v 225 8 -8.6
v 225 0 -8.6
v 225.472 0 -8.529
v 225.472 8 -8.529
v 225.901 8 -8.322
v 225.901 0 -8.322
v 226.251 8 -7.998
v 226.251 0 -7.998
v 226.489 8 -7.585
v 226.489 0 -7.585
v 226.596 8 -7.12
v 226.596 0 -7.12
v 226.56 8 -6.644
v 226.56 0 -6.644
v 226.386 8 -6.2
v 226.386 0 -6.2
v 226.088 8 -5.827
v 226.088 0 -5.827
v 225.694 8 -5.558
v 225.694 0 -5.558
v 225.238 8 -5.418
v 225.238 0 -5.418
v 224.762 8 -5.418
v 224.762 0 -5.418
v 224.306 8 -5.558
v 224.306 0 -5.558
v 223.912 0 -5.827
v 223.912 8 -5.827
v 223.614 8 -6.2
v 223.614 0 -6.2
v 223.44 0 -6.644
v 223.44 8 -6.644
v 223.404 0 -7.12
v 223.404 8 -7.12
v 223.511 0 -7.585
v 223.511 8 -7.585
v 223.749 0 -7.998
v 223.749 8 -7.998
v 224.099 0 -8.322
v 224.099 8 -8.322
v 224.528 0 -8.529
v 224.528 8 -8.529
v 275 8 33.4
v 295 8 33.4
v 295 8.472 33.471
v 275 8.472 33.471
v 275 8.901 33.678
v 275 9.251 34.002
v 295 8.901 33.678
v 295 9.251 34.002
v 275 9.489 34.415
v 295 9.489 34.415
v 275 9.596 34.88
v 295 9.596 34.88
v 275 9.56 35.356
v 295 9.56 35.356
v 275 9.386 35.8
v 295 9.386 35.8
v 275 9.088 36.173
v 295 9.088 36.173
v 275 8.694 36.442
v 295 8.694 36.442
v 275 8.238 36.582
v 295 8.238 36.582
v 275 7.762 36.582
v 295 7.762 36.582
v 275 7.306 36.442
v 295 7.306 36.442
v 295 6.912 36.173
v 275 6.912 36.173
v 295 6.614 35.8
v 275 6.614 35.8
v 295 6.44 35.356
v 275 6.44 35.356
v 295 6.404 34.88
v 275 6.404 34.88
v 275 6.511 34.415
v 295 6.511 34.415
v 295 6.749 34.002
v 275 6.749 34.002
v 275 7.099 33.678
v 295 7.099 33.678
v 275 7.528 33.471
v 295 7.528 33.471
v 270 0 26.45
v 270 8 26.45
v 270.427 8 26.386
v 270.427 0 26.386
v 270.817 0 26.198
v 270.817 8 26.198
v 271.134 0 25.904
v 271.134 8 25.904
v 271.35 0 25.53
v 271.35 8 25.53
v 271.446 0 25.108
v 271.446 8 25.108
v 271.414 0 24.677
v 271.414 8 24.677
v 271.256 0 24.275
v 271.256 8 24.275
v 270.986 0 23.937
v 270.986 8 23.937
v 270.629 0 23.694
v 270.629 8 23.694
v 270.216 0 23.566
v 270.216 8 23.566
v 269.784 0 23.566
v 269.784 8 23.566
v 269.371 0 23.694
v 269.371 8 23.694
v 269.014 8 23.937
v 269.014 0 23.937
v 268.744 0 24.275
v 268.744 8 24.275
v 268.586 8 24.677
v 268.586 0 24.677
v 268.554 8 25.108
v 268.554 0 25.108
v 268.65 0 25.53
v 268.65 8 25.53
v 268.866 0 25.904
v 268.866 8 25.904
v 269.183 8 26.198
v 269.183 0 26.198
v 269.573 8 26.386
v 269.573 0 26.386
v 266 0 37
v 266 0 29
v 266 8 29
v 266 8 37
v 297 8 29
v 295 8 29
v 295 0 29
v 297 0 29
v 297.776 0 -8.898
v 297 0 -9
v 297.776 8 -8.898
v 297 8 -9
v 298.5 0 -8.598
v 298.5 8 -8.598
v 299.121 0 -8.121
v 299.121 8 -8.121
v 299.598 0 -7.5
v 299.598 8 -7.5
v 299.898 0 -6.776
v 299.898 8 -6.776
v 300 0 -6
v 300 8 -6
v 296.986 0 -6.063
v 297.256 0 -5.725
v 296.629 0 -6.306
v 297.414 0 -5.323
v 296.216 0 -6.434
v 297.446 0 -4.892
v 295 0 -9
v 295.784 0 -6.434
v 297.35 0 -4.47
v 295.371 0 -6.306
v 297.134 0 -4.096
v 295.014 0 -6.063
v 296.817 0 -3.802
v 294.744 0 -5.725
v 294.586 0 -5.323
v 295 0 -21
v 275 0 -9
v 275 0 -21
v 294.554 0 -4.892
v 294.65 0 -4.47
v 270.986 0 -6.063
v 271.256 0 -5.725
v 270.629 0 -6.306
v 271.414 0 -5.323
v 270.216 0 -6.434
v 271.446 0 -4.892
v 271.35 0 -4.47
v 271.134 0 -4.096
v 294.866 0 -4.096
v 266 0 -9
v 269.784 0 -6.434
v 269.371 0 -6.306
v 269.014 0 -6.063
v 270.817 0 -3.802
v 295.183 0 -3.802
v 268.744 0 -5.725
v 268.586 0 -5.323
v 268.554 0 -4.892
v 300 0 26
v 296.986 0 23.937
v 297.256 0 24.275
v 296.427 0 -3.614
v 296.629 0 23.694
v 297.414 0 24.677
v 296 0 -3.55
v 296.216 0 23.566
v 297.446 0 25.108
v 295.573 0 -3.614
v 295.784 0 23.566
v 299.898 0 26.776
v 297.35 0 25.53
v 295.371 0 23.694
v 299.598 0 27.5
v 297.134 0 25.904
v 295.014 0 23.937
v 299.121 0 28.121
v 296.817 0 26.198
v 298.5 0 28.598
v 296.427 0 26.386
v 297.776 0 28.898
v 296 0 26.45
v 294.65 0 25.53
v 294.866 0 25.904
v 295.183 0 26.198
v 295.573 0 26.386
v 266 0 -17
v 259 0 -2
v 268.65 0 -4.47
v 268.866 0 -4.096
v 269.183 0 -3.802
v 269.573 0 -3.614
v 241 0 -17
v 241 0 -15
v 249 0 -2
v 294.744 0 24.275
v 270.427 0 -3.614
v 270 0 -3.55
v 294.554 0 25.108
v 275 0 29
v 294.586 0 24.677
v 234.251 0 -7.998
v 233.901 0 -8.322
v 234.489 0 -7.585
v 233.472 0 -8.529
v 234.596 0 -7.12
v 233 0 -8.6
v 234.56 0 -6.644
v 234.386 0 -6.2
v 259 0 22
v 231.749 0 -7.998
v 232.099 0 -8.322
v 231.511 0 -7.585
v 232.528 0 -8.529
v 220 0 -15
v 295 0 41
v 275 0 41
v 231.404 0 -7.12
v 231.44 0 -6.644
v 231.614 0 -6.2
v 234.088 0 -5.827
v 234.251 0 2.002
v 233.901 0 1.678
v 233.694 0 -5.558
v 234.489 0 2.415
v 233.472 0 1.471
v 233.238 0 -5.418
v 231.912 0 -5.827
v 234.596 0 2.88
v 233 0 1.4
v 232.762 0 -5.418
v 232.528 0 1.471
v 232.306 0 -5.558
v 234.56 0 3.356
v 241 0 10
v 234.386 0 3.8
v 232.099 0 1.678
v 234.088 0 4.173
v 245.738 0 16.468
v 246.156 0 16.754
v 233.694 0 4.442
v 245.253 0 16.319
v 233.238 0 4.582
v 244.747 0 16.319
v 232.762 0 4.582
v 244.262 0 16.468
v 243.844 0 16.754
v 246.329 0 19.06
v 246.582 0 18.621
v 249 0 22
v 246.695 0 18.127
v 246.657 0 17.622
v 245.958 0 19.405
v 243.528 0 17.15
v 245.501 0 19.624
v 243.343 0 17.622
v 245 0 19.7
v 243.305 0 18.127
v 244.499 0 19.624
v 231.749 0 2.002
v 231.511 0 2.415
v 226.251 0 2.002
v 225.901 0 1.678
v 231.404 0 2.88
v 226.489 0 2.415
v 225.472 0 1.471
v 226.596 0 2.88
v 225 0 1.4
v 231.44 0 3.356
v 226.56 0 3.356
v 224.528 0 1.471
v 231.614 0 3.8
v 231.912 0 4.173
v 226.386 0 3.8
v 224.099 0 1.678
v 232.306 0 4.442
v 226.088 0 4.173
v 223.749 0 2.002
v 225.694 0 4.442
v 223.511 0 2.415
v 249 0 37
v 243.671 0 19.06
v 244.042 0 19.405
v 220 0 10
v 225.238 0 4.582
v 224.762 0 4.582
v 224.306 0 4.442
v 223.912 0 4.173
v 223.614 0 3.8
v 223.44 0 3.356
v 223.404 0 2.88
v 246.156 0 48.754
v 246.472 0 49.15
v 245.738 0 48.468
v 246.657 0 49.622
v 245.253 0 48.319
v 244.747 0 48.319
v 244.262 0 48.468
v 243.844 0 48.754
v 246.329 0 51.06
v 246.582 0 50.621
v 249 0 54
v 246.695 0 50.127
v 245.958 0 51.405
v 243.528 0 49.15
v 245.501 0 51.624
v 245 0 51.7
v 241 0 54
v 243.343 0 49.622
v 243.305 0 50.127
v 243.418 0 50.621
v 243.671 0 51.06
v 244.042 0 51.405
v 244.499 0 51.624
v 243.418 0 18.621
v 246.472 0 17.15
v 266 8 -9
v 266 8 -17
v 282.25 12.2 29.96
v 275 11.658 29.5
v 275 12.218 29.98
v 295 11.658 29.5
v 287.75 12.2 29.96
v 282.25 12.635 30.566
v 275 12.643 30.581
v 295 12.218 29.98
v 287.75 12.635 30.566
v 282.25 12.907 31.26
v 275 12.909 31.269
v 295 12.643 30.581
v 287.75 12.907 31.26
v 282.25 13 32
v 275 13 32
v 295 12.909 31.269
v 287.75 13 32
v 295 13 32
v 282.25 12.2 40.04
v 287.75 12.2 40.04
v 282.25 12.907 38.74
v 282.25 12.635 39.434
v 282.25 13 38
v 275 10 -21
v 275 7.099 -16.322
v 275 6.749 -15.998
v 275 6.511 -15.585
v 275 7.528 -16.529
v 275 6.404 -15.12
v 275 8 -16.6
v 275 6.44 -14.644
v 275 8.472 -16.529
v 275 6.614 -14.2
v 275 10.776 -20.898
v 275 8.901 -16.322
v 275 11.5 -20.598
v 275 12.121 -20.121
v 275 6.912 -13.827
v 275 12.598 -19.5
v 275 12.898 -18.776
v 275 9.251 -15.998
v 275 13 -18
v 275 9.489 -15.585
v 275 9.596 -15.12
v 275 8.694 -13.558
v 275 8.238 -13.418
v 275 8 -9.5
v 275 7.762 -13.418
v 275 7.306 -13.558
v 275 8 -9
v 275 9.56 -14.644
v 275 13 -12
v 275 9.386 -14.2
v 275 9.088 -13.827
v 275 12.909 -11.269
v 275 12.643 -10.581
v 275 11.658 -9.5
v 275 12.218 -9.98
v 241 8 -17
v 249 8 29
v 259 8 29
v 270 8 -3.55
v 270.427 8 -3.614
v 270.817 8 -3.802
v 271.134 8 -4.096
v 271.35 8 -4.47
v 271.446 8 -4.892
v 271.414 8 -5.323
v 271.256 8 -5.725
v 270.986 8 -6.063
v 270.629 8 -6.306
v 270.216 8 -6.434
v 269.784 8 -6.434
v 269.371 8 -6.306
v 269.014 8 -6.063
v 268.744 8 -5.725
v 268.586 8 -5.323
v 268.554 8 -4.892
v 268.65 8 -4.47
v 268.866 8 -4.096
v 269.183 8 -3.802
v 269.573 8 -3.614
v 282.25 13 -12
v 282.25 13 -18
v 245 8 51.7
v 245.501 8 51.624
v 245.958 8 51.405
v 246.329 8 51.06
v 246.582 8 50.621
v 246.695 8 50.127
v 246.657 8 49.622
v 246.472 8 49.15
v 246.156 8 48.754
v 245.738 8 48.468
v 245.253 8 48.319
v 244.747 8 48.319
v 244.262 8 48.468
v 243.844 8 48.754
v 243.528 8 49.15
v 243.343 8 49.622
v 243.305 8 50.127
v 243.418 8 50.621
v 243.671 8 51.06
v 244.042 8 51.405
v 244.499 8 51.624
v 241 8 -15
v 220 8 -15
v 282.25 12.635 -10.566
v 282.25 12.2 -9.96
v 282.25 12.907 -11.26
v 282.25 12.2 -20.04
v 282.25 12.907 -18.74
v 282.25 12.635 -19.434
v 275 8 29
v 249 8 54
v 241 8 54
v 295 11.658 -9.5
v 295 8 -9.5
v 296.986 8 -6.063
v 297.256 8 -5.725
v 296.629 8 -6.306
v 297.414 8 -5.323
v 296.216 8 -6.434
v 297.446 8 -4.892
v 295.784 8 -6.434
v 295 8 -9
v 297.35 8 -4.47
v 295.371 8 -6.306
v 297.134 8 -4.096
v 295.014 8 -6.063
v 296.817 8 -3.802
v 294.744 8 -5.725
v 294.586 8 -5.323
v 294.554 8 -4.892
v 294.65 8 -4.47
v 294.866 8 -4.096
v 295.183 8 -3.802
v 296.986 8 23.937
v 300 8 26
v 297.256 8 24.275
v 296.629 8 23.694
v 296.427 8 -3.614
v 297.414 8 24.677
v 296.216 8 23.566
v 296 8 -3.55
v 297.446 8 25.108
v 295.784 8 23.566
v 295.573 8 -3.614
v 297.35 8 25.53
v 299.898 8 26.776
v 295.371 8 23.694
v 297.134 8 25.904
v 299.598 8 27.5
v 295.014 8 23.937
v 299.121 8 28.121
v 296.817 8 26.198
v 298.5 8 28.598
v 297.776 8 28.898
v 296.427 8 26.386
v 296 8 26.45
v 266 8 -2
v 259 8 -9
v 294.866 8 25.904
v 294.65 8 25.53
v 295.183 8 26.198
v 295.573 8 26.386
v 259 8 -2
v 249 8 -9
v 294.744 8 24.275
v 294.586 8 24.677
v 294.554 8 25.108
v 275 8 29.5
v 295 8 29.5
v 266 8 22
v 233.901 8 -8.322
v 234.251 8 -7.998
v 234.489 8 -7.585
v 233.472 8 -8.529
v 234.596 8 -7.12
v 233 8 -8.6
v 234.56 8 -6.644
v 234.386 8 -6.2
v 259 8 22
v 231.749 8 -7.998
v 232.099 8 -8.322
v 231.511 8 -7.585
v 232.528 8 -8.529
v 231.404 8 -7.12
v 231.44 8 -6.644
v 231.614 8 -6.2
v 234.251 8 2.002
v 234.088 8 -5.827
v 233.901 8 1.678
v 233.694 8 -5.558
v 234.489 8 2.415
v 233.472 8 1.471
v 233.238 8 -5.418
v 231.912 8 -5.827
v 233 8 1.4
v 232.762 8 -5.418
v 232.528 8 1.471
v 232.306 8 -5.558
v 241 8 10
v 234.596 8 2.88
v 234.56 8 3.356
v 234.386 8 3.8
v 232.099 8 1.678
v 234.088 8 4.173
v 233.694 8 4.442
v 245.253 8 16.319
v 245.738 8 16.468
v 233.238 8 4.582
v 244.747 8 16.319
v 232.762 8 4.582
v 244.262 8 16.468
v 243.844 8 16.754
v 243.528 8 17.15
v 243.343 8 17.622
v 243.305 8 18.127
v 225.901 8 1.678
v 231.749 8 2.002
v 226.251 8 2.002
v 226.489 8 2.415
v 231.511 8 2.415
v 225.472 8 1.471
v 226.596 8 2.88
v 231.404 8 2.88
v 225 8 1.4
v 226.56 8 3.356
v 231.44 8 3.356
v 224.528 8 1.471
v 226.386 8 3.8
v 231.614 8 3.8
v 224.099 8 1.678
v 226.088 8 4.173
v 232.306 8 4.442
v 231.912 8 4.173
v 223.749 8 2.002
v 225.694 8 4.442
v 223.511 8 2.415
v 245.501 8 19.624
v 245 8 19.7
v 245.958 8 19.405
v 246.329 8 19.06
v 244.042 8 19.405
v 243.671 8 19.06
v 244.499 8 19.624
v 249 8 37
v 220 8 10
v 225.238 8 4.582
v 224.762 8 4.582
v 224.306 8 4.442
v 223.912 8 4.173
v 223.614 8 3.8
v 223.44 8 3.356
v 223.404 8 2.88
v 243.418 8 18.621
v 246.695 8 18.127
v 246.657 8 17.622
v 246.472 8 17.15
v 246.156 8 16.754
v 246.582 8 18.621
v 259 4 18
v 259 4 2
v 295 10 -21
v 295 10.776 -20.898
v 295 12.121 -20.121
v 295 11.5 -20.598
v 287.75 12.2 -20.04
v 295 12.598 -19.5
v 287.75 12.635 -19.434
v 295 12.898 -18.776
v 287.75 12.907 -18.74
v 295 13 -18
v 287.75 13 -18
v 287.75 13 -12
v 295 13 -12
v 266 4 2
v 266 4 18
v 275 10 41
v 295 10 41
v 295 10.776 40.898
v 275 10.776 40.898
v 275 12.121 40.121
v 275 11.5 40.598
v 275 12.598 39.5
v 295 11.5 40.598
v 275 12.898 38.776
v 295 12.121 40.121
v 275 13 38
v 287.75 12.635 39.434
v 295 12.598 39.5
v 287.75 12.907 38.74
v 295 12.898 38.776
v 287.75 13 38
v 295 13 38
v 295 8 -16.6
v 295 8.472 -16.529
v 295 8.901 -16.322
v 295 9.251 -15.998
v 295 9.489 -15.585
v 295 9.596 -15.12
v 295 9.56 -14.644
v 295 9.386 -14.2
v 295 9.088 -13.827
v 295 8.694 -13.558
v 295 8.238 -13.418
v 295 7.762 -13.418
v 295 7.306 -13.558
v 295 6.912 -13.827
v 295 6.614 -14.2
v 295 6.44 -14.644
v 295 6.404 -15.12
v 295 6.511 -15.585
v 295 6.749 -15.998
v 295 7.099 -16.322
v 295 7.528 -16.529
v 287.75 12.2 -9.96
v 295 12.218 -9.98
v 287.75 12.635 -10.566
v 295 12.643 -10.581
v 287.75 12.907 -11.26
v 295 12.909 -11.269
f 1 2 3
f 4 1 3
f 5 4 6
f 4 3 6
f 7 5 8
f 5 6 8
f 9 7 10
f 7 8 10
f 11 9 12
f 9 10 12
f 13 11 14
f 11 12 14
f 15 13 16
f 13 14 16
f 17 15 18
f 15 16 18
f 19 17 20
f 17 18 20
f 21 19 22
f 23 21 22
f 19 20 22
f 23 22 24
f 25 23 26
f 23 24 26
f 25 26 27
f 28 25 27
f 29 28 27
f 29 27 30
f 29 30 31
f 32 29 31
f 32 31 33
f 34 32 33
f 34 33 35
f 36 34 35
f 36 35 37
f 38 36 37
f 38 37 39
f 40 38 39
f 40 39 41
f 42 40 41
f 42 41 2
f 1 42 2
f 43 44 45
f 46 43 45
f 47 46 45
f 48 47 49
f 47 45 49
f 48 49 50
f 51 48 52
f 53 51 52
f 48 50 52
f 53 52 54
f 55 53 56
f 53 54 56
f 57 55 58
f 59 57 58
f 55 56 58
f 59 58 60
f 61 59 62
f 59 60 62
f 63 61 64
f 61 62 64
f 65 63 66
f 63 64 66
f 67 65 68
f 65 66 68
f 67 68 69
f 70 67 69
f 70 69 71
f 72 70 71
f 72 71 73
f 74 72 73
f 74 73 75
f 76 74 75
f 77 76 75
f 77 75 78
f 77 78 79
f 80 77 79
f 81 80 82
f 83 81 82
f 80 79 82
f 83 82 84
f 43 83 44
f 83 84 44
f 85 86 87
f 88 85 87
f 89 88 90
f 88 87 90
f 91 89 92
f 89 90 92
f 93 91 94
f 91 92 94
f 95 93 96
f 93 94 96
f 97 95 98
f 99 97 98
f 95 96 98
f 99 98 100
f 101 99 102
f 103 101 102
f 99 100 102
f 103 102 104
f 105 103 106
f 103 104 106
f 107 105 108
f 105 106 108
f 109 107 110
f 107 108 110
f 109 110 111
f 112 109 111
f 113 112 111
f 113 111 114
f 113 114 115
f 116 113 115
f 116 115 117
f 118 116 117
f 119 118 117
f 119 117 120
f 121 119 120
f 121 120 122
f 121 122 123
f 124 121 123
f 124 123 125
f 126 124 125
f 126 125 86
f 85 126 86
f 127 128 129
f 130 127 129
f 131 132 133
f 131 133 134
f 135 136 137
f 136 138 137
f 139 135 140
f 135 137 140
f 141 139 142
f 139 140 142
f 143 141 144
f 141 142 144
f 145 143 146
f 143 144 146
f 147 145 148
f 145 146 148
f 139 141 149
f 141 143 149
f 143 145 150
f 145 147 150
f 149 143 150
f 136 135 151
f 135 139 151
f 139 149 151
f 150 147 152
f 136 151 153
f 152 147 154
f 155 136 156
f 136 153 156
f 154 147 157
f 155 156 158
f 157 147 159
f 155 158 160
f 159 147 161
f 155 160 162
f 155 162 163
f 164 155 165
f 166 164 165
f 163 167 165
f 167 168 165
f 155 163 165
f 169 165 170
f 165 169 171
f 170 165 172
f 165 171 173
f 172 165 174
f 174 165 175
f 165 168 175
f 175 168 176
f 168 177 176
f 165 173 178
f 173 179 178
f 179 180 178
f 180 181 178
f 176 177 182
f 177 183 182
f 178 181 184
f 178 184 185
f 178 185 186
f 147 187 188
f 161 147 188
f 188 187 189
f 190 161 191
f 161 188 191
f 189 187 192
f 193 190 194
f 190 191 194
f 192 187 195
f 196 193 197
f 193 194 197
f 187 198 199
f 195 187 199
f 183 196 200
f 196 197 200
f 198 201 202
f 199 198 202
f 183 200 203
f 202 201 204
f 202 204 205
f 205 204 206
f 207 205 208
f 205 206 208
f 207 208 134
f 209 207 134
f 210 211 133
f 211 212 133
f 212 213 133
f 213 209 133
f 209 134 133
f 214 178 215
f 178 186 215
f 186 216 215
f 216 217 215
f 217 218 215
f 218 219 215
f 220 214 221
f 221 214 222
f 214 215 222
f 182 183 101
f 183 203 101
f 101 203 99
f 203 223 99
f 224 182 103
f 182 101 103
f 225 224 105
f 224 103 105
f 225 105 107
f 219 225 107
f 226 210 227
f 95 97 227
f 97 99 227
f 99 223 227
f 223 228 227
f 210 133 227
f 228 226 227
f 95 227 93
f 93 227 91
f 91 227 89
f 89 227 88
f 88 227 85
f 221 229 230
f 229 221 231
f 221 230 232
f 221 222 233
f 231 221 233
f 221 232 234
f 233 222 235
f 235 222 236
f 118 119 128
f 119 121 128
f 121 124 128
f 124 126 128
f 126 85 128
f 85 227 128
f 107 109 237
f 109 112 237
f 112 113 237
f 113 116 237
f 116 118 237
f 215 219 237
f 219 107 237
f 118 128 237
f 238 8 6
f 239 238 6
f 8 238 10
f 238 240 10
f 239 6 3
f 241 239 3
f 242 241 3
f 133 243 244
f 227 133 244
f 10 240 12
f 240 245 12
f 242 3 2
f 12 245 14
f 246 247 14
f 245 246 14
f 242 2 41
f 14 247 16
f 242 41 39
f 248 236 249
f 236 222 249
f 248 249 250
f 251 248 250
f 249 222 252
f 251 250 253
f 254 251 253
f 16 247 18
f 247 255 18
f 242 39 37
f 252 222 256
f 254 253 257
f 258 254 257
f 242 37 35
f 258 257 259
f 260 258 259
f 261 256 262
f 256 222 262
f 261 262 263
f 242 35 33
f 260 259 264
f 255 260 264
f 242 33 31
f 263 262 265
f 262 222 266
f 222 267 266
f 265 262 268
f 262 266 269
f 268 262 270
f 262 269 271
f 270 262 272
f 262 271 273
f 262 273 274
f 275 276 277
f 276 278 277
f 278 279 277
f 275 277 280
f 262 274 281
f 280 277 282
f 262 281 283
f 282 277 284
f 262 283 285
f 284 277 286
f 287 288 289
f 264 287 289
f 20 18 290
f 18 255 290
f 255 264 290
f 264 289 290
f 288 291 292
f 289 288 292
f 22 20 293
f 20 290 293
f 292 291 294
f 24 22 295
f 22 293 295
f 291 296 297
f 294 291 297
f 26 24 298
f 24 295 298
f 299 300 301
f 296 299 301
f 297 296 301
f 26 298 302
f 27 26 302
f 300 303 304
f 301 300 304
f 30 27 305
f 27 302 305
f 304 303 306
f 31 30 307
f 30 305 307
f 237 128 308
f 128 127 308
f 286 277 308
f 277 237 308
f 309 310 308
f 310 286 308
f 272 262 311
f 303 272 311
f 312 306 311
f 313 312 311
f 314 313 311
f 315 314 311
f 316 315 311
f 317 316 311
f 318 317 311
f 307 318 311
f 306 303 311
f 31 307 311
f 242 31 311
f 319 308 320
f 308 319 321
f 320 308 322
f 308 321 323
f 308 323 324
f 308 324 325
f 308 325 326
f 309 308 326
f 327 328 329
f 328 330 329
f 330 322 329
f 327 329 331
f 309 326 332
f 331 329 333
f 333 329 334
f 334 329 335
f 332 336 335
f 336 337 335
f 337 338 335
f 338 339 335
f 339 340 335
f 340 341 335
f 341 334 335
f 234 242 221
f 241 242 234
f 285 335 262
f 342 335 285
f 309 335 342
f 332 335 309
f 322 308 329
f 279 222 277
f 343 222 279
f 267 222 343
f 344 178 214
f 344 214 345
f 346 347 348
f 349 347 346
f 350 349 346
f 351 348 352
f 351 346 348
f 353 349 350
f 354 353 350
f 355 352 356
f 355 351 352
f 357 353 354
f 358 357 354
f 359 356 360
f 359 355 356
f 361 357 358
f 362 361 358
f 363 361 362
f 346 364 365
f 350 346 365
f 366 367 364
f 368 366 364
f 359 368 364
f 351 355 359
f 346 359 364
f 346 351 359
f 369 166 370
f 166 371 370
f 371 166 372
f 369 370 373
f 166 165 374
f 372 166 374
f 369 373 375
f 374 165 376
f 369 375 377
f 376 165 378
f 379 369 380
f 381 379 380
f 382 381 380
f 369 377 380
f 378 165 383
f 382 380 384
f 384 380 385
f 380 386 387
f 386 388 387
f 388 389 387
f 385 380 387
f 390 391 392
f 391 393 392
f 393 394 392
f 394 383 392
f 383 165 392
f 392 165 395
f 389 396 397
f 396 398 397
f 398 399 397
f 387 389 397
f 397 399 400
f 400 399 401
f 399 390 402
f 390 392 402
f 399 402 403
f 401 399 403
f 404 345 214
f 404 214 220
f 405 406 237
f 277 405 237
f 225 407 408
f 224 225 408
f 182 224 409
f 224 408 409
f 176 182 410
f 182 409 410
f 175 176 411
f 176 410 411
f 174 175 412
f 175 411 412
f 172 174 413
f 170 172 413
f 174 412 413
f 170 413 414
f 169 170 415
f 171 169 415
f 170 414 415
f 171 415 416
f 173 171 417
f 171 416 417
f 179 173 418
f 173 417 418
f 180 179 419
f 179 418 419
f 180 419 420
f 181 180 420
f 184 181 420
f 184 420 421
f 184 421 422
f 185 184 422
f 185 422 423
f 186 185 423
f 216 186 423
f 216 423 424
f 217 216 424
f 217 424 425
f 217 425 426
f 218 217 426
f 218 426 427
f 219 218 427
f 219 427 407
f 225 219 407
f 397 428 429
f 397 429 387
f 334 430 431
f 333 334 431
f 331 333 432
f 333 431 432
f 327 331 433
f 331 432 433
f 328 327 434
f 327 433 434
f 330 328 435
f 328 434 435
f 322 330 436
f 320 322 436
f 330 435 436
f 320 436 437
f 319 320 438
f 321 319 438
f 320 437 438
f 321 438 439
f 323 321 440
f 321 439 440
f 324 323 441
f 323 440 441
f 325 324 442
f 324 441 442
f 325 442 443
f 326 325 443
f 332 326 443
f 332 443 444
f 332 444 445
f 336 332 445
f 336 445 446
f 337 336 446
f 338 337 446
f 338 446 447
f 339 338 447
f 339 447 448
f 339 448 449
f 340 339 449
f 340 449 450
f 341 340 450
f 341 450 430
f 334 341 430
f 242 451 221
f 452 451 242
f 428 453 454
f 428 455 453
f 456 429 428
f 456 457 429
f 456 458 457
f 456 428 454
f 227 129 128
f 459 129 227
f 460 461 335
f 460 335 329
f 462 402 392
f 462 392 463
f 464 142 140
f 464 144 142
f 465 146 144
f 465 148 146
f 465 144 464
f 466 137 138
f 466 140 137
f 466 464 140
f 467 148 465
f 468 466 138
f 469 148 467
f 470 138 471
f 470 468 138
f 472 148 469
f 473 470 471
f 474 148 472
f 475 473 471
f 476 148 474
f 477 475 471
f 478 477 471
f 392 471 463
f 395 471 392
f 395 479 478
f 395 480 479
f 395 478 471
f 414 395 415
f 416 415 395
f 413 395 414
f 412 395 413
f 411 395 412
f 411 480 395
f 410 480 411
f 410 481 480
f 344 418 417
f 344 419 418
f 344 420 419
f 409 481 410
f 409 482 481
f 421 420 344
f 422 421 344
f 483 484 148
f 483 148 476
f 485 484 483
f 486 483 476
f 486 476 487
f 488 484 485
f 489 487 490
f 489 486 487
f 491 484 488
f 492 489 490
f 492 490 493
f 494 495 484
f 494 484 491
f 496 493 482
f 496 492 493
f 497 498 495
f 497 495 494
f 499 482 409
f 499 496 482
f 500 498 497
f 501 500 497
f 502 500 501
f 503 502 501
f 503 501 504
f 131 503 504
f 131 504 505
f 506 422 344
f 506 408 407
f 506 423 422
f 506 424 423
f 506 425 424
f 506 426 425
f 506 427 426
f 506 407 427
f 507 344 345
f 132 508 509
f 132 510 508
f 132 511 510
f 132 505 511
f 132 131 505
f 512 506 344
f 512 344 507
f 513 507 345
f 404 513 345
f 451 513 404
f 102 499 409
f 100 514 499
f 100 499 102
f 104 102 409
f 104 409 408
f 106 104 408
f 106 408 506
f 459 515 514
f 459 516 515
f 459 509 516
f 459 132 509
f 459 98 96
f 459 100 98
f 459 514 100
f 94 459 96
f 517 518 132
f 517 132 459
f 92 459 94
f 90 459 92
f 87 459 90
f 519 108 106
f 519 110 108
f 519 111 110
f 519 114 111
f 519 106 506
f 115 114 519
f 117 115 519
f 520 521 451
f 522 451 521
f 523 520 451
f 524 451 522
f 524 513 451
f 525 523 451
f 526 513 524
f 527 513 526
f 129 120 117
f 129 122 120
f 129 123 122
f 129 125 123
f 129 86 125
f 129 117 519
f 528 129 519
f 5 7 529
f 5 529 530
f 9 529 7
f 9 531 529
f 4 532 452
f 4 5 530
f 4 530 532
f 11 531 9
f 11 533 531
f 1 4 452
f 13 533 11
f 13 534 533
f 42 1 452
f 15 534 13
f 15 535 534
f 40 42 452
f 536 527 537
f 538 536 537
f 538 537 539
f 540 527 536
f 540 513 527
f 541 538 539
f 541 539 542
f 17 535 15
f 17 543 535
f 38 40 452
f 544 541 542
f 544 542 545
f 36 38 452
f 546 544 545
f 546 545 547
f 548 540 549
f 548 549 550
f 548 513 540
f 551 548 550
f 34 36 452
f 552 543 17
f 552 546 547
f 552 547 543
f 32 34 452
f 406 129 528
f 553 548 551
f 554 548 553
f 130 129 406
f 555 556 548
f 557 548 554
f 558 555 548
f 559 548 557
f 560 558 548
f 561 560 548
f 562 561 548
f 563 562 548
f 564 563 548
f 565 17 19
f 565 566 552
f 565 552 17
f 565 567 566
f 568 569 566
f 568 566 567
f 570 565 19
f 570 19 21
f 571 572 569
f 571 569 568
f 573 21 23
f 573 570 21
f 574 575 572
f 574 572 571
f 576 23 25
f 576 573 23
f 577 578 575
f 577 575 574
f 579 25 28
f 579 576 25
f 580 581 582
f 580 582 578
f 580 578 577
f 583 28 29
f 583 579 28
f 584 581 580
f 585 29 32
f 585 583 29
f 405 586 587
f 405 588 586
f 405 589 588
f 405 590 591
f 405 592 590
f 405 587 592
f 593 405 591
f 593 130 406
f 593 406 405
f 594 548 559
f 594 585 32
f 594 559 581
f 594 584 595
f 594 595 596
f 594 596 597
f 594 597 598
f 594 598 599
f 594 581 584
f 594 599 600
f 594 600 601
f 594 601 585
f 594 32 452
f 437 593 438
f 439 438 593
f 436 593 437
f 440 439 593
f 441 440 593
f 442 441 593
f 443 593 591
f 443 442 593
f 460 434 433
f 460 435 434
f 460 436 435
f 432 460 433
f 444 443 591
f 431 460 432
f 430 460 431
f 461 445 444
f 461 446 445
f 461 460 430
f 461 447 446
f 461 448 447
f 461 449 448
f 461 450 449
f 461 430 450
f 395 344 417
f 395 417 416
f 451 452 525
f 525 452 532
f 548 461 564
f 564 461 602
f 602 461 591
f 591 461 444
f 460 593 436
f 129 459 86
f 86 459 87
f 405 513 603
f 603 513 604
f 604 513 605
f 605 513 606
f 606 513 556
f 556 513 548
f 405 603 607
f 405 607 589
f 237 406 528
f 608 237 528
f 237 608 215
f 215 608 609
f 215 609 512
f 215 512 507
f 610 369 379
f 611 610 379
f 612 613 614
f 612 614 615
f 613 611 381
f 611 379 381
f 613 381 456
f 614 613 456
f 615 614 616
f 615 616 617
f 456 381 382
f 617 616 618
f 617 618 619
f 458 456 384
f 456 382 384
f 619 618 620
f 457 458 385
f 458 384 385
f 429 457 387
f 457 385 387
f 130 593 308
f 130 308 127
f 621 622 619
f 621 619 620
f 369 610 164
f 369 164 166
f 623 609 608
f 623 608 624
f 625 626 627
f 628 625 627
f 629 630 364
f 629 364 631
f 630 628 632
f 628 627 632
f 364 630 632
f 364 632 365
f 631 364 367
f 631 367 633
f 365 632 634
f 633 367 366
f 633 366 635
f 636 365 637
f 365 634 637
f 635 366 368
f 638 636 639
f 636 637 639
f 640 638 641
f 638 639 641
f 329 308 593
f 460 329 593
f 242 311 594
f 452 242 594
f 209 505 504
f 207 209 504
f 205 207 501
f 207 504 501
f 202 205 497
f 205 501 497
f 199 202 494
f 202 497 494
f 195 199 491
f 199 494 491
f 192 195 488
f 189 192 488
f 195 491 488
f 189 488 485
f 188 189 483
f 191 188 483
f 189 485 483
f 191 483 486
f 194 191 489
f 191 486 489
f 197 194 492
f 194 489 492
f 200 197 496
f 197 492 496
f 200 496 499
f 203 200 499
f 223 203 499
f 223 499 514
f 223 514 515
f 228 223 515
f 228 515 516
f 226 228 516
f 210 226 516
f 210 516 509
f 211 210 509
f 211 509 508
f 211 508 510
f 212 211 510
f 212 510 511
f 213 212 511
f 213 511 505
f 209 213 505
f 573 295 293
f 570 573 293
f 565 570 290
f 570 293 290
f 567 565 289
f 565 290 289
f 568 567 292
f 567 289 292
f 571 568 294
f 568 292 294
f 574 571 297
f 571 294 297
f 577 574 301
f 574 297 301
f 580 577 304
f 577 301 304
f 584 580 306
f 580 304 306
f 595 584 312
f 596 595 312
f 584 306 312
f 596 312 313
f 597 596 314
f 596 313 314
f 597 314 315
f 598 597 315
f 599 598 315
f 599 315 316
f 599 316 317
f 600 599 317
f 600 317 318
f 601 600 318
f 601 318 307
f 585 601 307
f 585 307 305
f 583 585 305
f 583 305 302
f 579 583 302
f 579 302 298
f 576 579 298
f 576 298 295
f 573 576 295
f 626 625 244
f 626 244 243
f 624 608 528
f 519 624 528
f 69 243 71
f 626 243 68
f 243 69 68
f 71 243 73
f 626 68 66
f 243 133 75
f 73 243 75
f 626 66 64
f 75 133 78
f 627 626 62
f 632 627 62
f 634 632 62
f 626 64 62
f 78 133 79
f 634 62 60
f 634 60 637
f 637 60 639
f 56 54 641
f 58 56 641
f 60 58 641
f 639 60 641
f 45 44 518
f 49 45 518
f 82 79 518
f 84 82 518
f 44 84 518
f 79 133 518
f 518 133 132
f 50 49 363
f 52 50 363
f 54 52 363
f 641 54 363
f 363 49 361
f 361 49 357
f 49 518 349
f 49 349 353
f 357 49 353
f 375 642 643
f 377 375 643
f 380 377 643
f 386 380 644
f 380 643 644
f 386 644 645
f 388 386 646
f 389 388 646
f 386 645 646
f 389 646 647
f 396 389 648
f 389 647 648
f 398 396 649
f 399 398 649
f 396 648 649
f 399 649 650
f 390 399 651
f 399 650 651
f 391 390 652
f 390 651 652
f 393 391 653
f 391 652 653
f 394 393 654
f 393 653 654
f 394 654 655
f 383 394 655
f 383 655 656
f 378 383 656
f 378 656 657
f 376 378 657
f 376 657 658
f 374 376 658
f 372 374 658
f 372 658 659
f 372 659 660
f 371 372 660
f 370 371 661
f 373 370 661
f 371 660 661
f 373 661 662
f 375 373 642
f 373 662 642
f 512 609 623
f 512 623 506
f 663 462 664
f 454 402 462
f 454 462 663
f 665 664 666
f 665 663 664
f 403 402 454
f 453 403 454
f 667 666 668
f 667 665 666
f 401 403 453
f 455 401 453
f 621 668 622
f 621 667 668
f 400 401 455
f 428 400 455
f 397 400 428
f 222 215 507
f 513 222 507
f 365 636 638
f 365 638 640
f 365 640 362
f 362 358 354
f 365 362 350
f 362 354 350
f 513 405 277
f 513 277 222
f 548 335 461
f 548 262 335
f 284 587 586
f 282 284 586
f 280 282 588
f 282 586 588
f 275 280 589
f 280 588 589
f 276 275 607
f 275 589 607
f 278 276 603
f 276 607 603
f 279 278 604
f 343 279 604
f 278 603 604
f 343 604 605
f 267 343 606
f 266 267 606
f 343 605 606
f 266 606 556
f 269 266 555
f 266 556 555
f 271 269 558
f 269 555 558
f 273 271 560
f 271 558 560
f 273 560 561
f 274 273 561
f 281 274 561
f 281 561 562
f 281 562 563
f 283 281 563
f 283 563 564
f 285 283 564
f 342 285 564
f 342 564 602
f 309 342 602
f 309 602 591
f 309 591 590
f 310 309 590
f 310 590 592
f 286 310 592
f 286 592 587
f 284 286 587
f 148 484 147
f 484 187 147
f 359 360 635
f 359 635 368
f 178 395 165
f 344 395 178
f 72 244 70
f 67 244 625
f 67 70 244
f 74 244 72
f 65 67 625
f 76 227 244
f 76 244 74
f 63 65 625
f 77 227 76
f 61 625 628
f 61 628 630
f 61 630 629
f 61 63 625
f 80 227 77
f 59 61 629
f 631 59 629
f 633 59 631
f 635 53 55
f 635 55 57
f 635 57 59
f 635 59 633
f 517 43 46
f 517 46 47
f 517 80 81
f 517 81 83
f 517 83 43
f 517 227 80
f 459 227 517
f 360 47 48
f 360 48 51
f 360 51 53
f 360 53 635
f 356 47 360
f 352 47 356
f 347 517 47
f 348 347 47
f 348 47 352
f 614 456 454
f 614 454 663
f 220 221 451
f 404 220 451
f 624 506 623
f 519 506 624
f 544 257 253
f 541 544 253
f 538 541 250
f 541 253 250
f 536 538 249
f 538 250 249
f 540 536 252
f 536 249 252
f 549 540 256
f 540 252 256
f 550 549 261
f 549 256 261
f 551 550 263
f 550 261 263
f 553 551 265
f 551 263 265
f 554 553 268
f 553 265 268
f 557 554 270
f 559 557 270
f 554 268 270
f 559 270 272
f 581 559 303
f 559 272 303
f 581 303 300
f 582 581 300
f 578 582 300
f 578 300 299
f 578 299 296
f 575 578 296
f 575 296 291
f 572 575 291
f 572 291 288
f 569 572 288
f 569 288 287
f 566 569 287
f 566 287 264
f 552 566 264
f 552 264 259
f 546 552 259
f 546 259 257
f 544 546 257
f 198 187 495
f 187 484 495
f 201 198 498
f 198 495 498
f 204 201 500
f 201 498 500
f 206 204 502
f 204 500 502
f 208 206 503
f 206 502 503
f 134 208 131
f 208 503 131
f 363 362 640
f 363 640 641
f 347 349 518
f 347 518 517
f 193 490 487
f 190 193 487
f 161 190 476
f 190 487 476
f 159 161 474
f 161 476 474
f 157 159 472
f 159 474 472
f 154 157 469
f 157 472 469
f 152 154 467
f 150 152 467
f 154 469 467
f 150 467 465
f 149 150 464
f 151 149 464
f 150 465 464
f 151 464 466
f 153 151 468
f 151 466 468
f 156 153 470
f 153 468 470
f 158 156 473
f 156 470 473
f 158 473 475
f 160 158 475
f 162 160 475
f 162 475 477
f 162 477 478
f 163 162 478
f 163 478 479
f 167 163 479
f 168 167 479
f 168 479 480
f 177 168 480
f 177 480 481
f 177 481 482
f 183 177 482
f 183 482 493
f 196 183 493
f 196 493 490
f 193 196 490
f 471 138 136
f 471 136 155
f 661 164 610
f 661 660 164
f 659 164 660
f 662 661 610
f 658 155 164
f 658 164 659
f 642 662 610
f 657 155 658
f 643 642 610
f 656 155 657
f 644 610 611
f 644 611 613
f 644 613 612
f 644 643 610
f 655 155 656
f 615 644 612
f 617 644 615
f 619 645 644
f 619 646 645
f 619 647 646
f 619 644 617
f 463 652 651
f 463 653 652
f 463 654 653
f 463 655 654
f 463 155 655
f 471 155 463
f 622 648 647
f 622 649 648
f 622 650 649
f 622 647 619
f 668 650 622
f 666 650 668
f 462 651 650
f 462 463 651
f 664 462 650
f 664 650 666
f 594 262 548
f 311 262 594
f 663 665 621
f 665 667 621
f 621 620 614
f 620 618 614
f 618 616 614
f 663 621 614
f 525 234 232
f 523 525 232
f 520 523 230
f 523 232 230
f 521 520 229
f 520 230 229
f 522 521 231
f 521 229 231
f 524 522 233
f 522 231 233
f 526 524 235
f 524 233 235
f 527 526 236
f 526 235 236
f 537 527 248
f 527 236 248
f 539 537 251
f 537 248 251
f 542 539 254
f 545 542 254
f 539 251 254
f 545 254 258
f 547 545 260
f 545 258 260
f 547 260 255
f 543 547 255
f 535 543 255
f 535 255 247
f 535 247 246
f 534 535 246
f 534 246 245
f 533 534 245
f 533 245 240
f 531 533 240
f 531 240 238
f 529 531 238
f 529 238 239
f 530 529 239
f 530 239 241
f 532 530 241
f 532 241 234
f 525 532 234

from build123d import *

# Parameters (mm, degrees)
SKETCH1_W            = 300
SKETCH1_H            = 20
BOSS_EXTRUDE1_DEPTH  = 8
SKETCH2_W            = 34
SKETCH2_H            = 8
BOSS_EXTRUDE2_DEPTH  = 9
SKETCH3_W            = 34
SKETCH3_H            = 8
BOSS_EXTRUDE3_DEPTH  = 9
SKETCH4_R            = 1.45
CUT_EXTRUDE1_DEPTH   = 302.504560496
SKETCH5_W            = 25
SKETCH5_H            = 8
BOSS_EXTRUDE4_DEPTH  = 17
SKETCH6_W            = 25
SKETCH6_H            = 8
BOSS_EXTRUDE5_DEPTH  = 17
SKETCH7_W            = 10
SKETCH7_H            = 38
CUT_EXTRUDE2_DEPTH   = 303.37890138
SKETCH8_W            = 7
SKETCH8_H            = 16
CUT_EXTRUDE3_DEPTH   = 4
CUT_EXTRUDE4_DEPTH   = 7
BOSS_EXTRUDE6_DEPTH  = 10
SKETCH12_W           = 8
SKETCH12_H           = 8
BOSS_EXTRUDE7_DEPTH  = 17
SKETCH13_R           = 1.7
CUT_EXTRUDE6_DEPTH   = 305.926220585
SKETCH14_W           = 20
SKETCH14_H           = 13
BOSS_EXTRUDE8_DEPTH  = 12
SKETCH15_R           = 1.6
CUT_EXTRUDE7_DEPTH   = 20
SKETCH16_W           = 20
SKETCH16_H           = 13
BOSS_EXTRUDE9_DEPTH  = 12
SKETCH17_R           = 1.6
CUT_EXTRUDE8_DEPTH   = 20
SKETCH18_W           = 20
SKETCH18_H           = 13
BOSS_EXTRUDE10_DEPTH = 12
CUT_EXTRUDE9_START   = -20
SKETCH19_R           = 1.6
CUT_EXTRUDE9_DEPTH   = 20
SKETCH20_W           = 20
SKETCH20_H           = 13
BOSS_EXTRUDE11_DEPTH = 12
CUT_EXTRUDE10_START  = -20
SKETCH21_R           = 1.6
CUT_EXTRUDE10_DEPTH  = 20
FILLET6_R            = 3
SKETCH28_W           = 198.881436238
SKETCH28_H           = 556.355103816
CUT_EXTRUDE14_DEPTH  = 220
SKETCH29_W           = 21
SKETCH29_H           = 8
BOSS_EXTRUDE12_DEPTH = 15
SKETCH30_W           = 21
SKETCH30_H           = 10
CUT_EXTRUDE15_DEPTH  = 306.0983448
SKETCH31_R           = 1.6
CUT_EXTRUDE16_DEPTH  = 306.0983448
FILLET7_R            = 3
SKETCH32_W           = 5.5
SKETCH32_H           = 70.463459777
CUT_EXTRUDE17_DEPTH  = 0.8
SKETCH33_W           = 20
SKETCH33_H           = 4.963841857
CUT_EXTRUDE18_DEPTH  = 0.5
SKETCH34_W           = 20
SKETCH34_H           = 11.942443484
CUT_EXTRUDE19_DEPTH  = 0.5


with BuildPart() as part:
    # Sketch1 → Boss-Extrude1 (new body)
    with BuildSketch(Plane(origin=(0, 0, 0), x_dir=(1, 0, 0), z_dir=(0, 1, 0))):
        with Locations((150, -10)):
            Rectangle(SKETCH1_W, SKETCH1_H)
    extrude(amount=BOSS_EXTRUDE1_DEPTH)

    # Sketch2 → Boss-Extrude2 (add)
    with BuildSketch(Plane.XY.offset(20)):
        with Locations((17, 4)):
            Rectangle(SKETCH2_W, SKETCH2_H)
        with Locations((283, 4)):
            Rectangle(SKETCH2_W, SKETCH2_H)
    extrude(amount=BOSS_EXTRUDE2_DEPTH)

    # Sketch3 → Boss-Extrude3 (add)
    with BuildSketch(Plane(origin=(0, 0, 0), x_dir=(-1, 0, 0), z_dir=(0, 0, -1))):
        with Locations((-17, 4)):
            Rectangle(SKETCH3_W, SKETCH3_H)
        with Locations((-283, 4)):
            Rectangle(SKETCH3_W, SKETCH3_H)
    extrude(amount=BOSS_EXTRUDE3_DEPTH)

    # Sketch4 → Cut-Extrude1 (cut, through all)
    with BuildSketch(Plane(origin=(0, 8, 0), x_dir=(1, 0, 0), z_dir=(0, 1, 0))):
        with Locations(Location((4, 5, 0), (0, 0, 270))):
            Circle(SKETCH4_R)
        with Locations(Location((30, 5, 0), (0, 0, 270))):
            Circle(SKETCH4_R)
        with Locations(Location((30, -25, 0), (0, 0, 270))):
            Circle(SKETCH4_R)
        with Locations(Location((4, -25, 0), (0, 0, 270))):
            Circle(SKETCH4_R)
        with Locations(Location((296, -25, 0), (0, 0, 270))):
            Circle(SKETCH4_R)
        with Locations(Location((296, 5, 0), (0, 0, 270))):
            Circle(SKETCH4_R)
        with Locations(Location((270, -25, 0), (0, 0, 270))):
            Circle(SKETCH4_R)
        with Locations(Location((270, 5, 0), (0, 0, 270))):
            Circle(SKETCH4_R)
    extrude(amount=-CUT_EXTRUDE1_DEPTH, mode=Mode.SUBTRACT)

    # Sketch5 → Boss-Extrude4 (add)
    with BuildSketch(Plane.XY.offset(20)):
        with Locations((253.5, 4)):
            Rectangle(SKETCH5_W, SKETCH5_H)
    extrude(amount=BOSS_EXTRUDE4_DEPTH)

    # Sketch6 → Boss-Extrude5 (add)
    with BuildSketch(Plane(origin=(0, 0, 0), x_dir=(-1, 0, 0), z_dir=(0, 0, -1))):
        with Locations((-253.5, 4)):
            Rectangle(SKETCH6_W, SKETCH6_H)
    extrude(amount=BOSS_EXTRUDE5_DEPTH)

    # Sketch7 → Cut-Extrude2 (cut, through all)
    with BuildSketch(Plane(origin=(0, 8, 0), x_dir=(1, 0, 0), z_dir=(0, 1, 0))):
        with Locations((254, -10)):
            Rectangle(SKETCH7_W, SKETCH7_H)
    extrude(amount=-CUT_EXTRUDE2_DEPTH, mode=Mode.SUBTRACT)

    # Sketch8 → Cut-Extrude3 (cut)
    with BuildSketch(Plane(origin=(0, 8, 0), x_dir=(1, 0, 0), z_dir=(0, 1, 0))):
        with Locations((262.5, -10)):
            Rectangle(SKETCH8_W, SKETCH8_H)
    extrude(amount=-CUT_EXTRUDE3_DEPTH, mode=Mode.SUBTRACT)

    # Sketch9 → Cut-Extrude4 (cut)
    with BuildSketch(Plane.ZY.offset(-259)):
        Polygon((18, 4), (22, 8), (18, 8), align=None)
        Polygon((2, 4), (-2, 8), (2, 8), align=None)
    extrude(amount=-CUT_EXTRUDE4_DEPTH, mode=Mode.SUBTRACT)

    # Sketch10 → Boss-Extrude6 (add)
    with BuildSketch(Plane.ZY.offset(-259)):
        Polygon((-2, 0), (-9, 8), (-9, 0), align=None)
        Polygon((29, 8), (22, 0), (29, 0), align=None)
    extrude(amount=BOSS_EXTRUDE6_DEPTH)

    # Sketch12 → Boss-Extrude7 (add)
    with BuildSketch(Plane.XY.offset(37)):
        with Locations((245, 4)):
            Rectangle(SKETCH12_W, SKETCH12_H)
    extrude(amount=BOSS_EXTRUDE7_DEPTH)

    # Sketch13 → Cut-Extrude6 (cut, through all)
    with BuildSketch(Plane(origin=(0, 8, 0), x_dir=(1, 0, 0), z_dir=(0, 1, 0))):
        with Locations(Location((245, -50, 0), (0, 0, 270))):
            Circle(SKETCH13_R)
        with Locations(Location((245, -18, 0), (0, 0, 270))):
            Circle(SKETCH13_R)
    extrude(amount=-CUT_EXTRUDE6_DEPTH, mode=Mode.SUBTRACT)

    # Sketch14 → Boss-Extrude8 (add)
    with BuildSketch(Plane.XY.offset(29)):
        with Locations((285, 6.5)):
            Rectangle(SKETCH14_W, SKETCH14_H)
    extrude(amount=BOSS_EXTRUDE8_DEPTH)

    # Sketch15 → Cut-Extrude7 (cut)
    with BuildSketch(Plane(origin=(295, 0, 0), x_dir=(0, 0, -1), z_dir=(1, 0, 0))):
        with Locations((-35, 8)):
            Circle(SKETCH15_R)
    extrude(amount=-CUT_EXTRUDE7_DEPTH, mode=Mode.SUBTRACT)

    # Sketch16 → Boss-Extrude9 (add)
    with BuildSketch(Plane(origin=(0, 0, -9), x_dir=(-1, 0, 0), z_dir=(0, 0, -1))):
        with Locations((-285, 6.5)):
            Rectangle(SKETCH16_W, SKETCH16_H)
    extrude(amount=BOSS_EXTRUDE9_DEPTH)

    # Sketch17 → Cut-Extrude8 (cut)
    with BuildSketch(Plane(origin=(295, 0, 0), x_dir=(0, 0, -1), z_dir=(1, 0, 0))):
        with Locations((15, 8)):
            Circle(SKETCH17_R)
    extrude(amount=-CUT_EXTRUDE8_DEPTH, mode=Mode.SUBTRACT)

    # Sketch18 → Boss-Extrude10 (add)
    with BuildSketch(Plane(origin=(0, 0, -9), x_dir=(-1, 0, 0), z_dir=(0, 0, -1))):
        with Locations((-15, 6.5)):
            Rectangle(SKETCH18_W, SKETCH18_H)
    extrude(amount=BOSS_EXTRUDE10_DEPTH)

    # Sketch19 → Cut-Extrude9 (cut)
    with BuildSketch(Plane.ZY.offset(-5).offset(CUT_EXTRUDE9_START)):
        with Locations(Location((-15, 8, 0), (0, 0, 180))):
            Circle(SKETCH19_R)
    extrude(amount=CUT_EXTRUDE9_DEPTH, mode=Mode.SUBTRACT)

    # Sketch20 → Boss-Extrude11 (add)
    with BuildSketch(Plane.XY.offset(29)):
        with Locations((15, 6.5)):
            Rectangle(SKETCH20_W, SKETCH20_H)
    extrude(amount=BOSS_EXTRUDE11_DEPTH)

    # Sketch21 → Cut-Extrude10 (cut)
    with BuildSketch(Plane.ZY.offset(-5).offset(CUT_EXTRUDE10_START)):
        with Locations(Location((35, 8, 0), (0, 0, 180))):
            Circle(SKETCH21_R)
    extrude(amount=CUT_EXTRUDE10_DEPTH, mode=Mode.SUBTRACT)

    # Fillet6
    fillet6_edges = [part.edges().sort_by_distance(p)[0] for p in [
        (285, 13, 29),
        (285, 13, 41),
        (285, 13, -9),
        (285, 13, -21),
        (15, 13, -9),
        (15, 13, -21),
        (15, 13, 29),
        (15, 13, 41),
    ]]
    fillet(fillet6_edges, radius=FILLET6_R)

    # Sketch28 → Cut-Extrude14 (cut)
    with BuildSketch(Plane.ZY):
        with Locations((-20.495432896, -60.484201615)):
            Rectangle(SKETCH28_W, SKETCH28_H)
    extrude(amount=-CUT_EXTRUDE14_DEPTH, mode=Mode.SUBTRACT)

    # Sketch29 → Boss-Extrude12 (add)
    with BuildSketch(Plane(origin=(0, 0, 0), x_dir=(-1, 0, 0), z_dir=(0, 0, -1))):
        with Locations((-230.5, 4)):
            Rectangle(SKETCH29_W, SKETCH29_H)
    extrude(amount=BOSS_EXTRUDE12_DEPTH)

    # Sketch30 → Cut-Extrude15 (cut, through all)
    with BuildSketch(Plane(origin=(0, 0, 0), x_dir=(-1, 0, 0), z_dir=(0, -1, 0))):
        with Locations((-230.5, -15)):
            Rectangle(SKETCH30_W, SKETCH30_H)
    extrude(amount=-CUT_EXTRUDE15_DEPTH, mode=Mode.SUBTRACT)

    # Sketch31 → Cut-Extrude16 (cut, through all)
    with BuildSketch(Plane(origin=(0, 0, 0), x_dir=(-1, 0, 0), z_dir=(0, -1, 0))):
        with Locations(Location((-225, 7, 0), (0, 0, 90))):
            Circle(SKETCH31_R)
        with Locations(Location((-225, -3, 0), (0, 0, 90))):
            Circle(SKETCH31_R)
        with Locations(Location((-233, 7, 0), (0, 0, 90))):
            Circle(SKETCH31_R)
        with Locations(Location((-233, -3, 0), (0, 0, 90))):
            Circle(SKETCH31_R)
    extrude(amount=-CUT_EXTRUDE16_DEPTH, mode=Mode.SUBTRACT)

    # Fillet7
    fillet7_edges = [part.edges().sort_by_distance(p)[0] for p in [
        (300, 4, 29),
        (300, 4, -9),
    ]]
    fillet(fillet7_edges, radius=FILLET7_R)

    # Sketch32 → Cut-Extrude17 (cut)
    with BuildSketch(Plane(origin=(0, 13, 0), x_dir=(1, 0, 0), z_dir=(0, 1, 0))):
        with Locations((285, -7.2213573)):
            Rectangle(SKETCH32_W, SKETCH32_H)
    extrude(amount=-CUT_EXTRUDE17_DEPTH, mode=Mode.SUBTRACT)

    # Sketch33 → Cut-Extrude18 (cut)
    with BuildSketch(Plane(origin=(0, 0, 29), x_dir=(-1, 0, 0), z_dir=(0, 0, -1))):
        with Locations((-285, 10.481920928)):
            Rectangle(SKETCH33_W, SKETCH33_H)
    extrude(amount=-CUT_EXTRUDE18_DEPTH, mode=Mode.SUBTRACT)

    # Sketch34 → Cut-Extrude19 (cut)
    with BuildSketch(Plane.XY.offset(-9)):
        with Locations((285, 13.971221742)):
            Rectangle(SKETCH34_W, SKETCH34_H)
    extrude(amount=-CUT_EXTRUDE19_DEPTH, mode=Mode.SUBTRACT)


solid = part.part
